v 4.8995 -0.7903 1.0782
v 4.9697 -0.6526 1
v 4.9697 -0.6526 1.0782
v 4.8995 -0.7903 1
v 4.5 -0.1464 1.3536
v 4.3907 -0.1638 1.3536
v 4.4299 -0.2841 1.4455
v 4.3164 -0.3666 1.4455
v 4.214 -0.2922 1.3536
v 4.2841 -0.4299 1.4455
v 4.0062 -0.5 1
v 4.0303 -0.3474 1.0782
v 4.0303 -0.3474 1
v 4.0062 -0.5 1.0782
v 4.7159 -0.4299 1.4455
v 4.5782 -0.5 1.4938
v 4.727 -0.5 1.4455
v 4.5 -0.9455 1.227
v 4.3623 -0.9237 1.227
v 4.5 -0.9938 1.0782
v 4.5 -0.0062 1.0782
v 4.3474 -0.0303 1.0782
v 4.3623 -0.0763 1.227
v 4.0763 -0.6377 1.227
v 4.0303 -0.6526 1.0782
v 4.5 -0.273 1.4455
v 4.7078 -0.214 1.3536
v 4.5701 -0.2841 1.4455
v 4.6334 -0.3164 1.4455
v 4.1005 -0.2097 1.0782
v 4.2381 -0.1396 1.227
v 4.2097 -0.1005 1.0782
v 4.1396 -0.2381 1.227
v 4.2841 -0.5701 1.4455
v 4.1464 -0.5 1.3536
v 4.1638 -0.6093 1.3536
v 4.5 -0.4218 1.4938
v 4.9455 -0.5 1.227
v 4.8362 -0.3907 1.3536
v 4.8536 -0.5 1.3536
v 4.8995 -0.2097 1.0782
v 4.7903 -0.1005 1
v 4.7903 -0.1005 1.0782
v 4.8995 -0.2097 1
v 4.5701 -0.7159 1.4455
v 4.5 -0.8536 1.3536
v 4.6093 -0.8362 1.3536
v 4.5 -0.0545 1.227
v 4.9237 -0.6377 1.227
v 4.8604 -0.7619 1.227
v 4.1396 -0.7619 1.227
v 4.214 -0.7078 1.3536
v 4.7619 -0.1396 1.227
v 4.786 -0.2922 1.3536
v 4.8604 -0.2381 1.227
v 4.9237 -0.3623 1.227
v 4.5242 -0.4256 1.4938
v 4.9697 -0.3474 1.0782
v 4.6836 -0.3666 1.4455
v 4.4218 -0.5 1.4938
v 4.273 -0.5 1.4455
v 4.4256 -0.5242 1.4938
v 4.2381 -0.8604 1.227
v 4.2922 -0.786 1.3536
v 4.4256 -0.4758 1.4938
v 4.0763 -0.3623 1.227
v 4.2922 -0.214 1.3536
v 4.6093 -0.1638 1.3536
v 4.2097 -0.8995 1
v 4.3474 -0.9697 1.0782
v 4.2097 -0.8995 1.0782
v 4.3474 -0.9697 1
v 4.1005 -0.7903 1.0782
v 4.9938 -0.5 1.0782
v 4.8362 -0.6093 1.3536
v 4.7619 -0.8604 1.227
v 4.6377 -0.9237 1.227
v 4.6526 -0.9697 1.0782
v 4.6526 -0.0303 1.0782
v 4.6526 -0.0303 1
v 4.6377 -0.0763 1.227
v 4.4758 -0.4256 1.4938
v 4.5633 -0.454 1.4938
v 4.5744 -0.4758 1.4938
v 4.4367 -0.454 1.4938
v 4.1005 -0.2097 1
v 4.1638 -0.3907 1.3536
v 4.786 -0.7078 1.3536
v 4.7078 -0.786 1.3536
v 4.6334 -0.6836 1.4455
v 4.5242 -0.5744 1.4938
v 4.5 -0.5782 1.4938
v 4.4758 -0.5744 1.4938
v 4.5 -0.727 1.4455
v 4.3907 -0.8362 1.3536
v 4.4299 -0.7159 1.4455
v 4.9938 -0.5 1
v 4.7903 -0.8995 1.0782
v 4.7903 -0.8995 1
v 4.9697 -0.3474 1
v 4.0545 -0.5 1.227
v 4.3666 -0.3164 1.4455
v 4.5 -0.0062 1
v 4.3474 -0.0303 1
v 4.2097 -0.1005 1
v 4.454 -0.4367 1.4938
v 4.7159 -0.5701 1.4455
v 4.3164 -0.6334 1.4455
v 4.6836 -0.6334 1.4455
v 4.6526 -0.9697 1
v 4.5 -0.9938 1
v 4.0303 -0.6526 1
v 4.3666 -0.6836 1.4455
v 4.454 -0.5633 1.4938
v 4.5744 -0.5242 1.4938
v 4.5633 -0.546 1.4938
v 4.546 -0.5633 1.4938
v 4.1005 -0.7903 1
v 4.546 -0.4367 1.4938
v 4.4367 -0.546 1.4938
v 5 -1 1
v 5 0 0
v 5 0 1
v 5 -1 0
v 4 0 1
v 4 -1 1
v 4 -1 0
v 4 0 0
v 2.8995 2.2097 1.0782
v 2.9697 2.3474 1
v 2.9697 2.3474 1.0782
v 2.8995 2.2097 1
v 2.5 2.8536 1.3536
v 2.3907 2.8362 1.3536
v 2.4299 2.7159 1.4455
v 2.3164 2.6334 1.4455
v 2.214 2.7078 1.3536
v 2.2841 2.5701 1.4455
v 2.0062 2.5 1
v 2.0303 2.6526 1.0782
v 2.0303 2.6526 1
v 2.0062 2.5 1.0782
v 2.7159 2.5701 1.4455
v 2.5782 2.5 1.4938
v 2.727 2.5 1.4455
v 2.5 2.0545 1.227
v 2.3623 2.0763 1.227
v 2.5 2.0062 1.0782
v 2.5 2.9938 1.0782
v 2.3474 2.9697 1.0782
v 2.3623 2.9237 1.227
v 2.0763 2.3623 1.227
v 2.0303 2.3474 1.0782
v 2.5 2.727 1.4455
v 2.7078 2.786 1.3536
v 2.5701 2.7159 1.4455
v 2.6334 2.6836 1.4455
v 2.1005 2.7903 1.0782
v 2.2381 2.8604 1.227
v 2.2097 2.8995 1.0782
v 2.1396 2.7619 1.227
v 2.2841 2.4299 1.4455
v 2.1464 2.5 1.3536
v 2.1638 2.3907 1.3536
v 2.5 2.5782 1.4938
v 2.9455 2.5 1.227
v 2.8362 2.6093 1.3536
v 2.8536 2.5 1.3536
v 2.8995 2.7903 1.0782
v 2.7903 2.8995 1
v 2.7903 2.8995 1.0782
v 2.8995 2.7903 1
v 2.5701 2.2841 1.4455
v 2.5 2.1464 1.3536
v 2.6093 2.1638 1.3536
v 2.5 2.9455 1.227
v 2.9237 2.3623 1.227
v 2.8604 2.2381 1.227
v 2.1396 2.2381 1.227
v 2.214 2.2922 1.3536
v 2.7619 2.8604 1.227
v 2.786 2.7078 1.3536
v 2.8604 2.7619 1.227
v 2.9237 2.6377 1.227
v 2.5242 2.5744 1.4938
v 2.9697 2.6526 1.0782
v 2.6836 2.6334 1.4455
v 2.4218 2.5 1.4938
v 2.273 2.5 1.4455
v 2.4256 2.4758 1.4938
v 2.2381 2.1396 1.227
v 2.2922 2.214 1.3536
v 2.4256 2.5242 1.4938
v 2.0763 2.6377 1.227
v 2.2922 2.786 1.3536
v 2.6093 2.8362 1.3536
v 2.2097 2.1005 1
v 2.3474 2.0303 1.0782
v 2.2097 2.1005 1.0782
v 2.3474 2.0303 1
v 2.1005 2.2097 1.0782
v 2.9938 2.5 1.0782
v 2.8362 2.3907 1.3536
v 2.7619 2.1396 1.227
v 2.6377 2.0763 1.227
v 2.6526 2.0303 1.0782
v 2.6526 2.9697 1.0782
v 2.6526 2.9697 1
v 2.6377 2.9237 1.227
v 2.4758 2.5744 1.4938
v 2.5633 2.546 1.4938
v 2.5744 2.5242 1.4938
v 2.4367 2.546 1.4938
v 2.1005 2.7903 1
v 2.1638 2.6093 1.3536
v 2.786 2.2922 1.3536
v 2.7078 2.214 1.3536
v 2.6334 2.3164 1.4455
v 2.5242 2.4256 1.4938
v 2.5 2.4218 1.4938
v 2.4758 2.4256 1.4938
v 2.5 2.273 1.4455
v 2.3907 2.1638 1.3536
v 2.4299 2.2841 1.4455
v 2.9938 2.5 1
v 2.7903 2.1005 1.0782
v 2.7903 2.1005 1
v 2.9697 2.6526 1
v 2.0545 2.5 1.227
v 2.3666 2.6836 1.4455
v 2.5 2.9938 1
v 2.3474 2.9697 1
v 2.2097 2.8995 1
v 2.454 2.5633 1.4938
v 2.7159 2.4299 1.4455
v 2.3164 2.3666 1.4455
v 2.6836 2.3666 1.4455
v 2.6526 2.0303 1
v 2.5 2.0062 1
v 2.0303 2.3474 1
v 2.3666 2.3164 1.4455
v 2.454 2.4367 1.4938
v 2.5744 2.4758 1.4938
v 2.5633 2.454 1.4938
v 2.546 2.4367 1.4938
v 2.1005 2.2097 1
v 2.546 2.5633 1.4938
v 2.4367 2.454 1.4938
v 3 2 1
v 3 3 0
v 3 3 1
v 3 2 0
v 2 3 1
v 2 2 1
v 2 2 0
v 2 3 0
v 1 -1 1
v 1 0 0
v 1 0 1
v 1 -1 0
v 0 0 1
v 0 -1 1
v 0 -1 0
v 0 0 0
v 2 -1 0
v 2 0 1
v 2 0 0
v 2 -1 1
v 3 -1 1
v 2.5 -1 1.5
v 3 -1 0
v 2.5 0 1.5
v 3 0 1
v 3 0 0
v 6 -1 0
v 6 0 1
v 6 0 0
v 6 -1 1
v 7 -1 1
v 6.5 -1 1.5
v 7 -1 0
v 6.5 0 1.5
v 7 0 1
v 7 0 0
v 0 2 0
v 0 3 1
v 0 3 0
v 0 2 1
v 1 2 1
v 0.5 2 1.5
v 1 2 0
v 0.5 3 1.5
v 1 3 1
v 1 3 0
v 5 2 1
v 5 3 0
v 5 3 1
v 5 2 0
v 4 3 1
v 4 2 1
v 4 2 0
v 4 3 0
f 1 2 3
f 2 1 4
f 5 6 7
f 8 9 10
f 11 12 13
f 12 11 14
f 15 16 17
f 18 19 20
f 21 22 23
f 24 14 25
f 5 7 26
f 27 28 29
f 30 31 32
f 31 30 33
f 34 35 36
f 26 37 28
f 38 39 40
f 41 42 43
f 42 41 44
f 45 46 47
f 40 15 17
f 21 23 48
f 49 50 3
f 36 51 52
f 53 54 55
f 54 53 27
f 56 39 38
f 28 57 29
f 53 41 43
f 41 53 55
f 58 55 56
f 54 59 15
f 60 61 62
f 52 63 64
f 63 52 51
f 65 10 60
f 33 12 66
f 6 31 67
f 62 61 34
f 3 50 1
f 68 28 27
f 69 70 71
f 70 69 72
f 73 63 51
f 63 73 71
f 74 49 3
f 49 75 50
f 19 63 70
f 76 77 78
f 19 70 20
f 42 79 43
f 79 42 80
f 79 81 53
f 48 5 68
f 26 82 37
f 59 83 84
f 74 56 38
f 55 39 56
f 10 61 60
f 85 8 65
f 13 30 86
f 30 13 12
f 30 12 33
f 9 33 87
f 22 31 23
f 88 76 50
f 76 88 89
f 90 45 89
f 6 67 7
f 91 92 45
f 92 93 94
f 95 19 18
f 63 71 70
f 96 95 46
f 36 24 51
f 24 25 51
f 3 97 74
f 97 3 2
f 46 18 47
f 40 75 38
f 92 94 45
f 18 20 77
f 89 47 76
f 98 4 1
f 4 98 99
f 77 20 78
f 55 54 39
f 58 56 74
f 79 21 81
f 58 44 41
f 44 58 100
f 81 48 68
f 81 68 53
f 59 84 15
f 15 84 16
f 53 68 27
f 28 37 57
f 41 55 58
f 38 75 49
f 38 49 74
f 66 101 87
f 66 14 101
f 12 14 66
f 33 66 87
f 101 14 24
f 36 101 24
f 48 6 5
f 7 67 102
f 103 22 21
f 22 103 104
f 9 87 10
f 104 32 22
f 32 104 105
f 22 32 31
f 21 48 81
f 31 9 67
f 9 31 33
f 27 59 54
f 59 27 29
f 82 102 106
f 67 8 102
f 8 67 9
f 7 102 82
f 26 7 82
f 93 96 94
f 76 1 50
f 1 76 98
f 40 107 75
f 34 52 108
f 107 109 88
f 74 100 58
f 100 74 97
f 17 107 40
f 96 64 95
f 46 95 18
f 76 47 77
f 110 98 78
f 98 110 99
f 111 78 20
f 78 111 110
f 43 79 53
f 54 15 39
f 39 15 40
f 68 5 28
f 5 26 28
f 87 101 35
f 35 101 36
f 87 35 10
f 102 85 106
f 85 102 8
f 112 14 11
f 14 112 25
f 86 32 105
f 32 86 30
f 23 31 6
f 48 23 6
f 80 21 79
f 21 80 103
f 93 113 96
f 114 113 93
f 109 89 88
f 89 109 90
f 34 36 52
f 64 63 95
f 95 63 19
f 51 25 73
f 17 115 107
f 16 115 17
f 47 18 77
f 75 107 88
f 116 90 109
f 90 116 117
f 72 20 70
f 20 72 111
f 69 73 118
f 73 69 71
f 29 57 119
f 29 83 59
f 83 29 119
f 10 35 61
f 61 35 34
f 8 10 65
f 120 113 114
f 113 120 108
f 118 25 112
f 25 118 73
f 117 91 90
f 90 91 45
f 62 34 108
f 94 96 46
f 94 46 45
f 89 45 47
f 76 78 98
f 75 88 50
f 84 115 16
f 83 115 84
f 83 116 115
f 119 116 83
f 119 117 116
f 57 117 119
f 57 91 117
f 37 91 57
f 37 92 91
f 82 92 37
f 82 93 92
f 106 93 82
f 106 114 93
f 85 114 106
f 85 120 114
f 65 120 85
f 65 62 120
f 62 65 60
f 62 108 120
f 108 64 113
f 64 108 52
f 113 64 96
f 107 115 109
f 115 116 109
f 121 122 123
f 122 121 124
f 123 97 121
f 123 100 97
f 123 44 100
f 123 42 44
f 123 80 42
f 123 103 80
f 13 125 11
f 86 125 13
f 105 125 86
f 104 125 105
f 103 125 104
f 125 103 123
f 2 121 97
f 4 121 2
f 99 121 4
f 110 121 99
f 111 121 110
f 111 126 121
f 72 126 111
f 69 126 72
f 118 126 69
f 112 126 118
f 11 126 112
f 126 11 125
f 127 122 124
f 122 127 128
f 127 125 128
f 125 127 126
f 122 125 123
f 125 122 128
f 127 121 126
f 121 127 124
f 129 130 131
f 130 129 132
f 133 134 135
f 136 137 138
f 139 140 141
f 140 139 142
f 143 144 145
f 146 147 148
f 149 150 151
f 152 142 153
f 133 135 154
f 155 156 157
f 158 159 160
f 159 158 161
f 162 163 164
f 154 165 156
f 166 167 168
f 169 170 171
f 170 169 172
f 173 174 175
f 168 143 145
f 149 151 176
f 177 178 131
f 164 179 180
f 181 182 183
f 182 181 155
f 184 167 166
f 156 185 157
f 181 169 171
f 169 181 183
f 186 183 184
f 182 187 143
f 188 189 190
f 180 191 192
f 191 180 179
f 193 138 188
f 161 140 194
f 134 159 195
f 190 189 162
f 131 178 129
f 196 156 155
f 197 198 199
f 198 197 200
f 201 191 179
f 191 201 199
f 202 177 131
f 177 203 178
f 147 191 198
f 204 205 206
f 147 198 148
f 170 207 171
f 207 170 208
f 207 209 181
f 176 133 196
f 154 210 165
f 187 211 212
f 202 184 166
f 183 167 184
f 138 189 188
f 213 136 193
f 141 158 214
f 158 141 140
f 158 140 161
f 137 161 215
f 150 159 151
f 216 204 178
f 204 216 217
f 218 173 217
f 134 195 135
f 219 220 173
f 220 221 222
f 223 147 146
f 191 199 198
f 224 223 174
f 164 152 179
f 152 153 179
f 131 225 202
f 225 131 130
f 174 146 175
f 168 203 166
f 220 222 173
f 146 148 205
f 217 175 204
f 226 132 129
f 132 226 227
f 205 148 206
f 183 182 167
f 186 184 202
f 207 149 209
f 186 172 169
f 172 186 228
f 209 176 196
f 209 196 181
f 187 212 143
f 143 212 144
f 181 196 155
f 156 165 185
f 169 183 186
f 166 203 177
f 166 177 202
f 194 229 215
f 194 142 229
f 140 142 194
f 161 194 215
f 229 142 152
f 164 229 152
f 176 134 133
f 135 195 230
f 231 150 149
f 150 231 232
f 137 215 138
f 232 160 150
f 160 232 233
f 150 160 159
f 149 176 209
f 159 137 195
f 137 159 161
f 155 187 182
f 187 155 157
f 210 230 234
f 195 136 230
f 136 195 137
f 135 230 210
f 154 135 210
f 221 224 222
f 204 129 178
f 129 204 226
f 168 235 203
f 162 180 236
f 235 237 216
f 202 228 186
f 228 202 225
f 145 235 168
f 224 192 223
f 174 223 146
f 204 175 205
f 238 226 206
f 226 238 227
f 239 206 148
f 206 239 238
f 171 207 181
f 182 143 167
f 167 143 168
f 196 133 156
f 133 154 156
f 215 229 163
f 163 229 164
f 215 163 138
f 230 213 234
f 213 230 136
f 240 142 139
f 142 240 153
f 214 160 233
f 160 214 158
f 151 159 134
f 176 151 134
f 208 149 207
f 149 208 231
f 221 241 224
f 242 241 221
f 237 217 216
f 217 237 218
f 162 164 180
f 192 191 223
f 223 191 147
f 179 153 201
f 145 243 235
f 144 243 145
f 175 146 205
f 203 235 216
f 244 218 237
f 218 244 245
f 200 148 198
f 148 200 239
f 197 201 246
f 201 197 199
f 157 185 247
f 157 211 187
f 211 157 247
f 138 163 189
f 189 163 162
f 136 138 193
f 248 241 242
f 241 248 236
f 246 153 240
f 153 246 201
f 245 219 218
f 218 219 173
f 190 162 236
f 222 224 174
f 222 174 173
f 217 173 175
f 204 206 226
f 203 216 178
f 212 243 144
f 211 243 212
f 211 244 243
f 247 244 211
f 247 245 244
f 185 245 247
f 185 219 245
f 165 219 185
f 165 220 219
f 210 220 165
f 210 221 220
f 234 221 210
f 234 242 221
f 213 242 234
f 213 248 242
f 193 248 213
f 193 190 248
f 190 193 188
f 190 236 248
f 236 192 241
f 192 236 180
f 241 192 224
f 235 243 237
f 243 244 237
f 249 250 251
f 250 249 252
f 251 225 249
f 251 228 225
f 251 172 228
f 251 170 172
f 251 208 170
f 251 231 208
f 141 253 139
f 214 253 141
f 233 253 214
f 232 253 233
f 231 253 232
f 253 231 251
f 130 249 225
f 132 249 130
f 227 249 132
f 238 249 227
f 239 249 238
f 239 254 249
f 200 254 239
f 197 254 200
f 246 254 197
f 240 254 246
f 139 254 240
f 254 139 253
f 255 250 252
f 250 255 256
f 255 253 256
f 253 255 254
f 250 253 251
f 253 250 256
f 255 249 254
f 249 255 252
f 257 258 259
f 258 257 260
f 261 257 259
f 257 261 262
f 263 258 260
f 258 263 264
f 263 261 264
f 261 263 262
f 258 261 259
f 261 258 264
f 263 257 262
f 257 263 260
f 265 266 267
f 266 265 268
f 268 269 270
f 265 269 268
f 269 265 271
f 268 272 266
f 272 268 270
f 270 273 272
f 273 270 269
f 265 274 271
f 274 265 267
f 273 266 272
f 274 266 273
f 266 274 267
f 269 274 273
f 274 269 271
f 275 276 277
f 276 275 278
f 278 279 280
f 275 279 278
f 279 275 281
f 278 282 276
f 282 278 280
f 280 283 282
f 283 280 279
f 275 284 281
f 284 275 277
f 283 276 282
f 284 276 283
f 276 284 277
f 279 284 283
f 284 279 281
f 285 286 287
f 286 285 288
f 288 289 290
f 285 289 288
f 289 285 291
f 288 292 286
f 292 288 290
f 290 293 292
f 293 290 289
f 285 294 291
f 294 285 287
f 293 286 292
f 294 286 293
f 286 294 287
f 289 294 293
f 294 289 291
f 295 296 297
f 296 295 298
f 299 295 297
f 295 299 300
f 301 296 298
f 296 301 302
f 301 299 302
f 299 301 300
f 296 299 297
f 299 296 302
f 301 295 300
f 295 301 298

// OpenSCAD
// From https://en.wikibooks.org/wiki/OpenSCAD_User_Manual/User-Defined_Functions_and_Modules#Object_modules
//example 2
module house(roof="flat",paint=[1,0,0]) {
   color(paint)
      if(roof=="flat") { translate([0,-1,0]) cube(); }
         else if(roof=="pitched") {
              rotate([90,0,0]) linear_extrude(height=1)
                   polygon(points=[[0,0],[0,1],[0.5,1.5],[1,1],[1,0]]); }
                      else if(roof=="domical") {
                           translate([0,-1,0]){
                                  translate([0.5,0.5,1]) sphere(r=0.5,$fn=20); cube(); }
                                  } }

                                                     house();
                                                     translate([2,0,0]) house("pitched");
                                                     translate([4,0,0]) house("domical",[0,1,0]);
                                                     translate([6,0,0]) house(roof="pitched",paint=[0,0,1]);
                                                     translate([0,3,0]) house(paint=[0,0,0],roof="pitched");
                                                     translate([2,3,0]) house(roof="domical");
                                                     translate([4,3,0]) house(paint=[0,0.5,0.5]);
